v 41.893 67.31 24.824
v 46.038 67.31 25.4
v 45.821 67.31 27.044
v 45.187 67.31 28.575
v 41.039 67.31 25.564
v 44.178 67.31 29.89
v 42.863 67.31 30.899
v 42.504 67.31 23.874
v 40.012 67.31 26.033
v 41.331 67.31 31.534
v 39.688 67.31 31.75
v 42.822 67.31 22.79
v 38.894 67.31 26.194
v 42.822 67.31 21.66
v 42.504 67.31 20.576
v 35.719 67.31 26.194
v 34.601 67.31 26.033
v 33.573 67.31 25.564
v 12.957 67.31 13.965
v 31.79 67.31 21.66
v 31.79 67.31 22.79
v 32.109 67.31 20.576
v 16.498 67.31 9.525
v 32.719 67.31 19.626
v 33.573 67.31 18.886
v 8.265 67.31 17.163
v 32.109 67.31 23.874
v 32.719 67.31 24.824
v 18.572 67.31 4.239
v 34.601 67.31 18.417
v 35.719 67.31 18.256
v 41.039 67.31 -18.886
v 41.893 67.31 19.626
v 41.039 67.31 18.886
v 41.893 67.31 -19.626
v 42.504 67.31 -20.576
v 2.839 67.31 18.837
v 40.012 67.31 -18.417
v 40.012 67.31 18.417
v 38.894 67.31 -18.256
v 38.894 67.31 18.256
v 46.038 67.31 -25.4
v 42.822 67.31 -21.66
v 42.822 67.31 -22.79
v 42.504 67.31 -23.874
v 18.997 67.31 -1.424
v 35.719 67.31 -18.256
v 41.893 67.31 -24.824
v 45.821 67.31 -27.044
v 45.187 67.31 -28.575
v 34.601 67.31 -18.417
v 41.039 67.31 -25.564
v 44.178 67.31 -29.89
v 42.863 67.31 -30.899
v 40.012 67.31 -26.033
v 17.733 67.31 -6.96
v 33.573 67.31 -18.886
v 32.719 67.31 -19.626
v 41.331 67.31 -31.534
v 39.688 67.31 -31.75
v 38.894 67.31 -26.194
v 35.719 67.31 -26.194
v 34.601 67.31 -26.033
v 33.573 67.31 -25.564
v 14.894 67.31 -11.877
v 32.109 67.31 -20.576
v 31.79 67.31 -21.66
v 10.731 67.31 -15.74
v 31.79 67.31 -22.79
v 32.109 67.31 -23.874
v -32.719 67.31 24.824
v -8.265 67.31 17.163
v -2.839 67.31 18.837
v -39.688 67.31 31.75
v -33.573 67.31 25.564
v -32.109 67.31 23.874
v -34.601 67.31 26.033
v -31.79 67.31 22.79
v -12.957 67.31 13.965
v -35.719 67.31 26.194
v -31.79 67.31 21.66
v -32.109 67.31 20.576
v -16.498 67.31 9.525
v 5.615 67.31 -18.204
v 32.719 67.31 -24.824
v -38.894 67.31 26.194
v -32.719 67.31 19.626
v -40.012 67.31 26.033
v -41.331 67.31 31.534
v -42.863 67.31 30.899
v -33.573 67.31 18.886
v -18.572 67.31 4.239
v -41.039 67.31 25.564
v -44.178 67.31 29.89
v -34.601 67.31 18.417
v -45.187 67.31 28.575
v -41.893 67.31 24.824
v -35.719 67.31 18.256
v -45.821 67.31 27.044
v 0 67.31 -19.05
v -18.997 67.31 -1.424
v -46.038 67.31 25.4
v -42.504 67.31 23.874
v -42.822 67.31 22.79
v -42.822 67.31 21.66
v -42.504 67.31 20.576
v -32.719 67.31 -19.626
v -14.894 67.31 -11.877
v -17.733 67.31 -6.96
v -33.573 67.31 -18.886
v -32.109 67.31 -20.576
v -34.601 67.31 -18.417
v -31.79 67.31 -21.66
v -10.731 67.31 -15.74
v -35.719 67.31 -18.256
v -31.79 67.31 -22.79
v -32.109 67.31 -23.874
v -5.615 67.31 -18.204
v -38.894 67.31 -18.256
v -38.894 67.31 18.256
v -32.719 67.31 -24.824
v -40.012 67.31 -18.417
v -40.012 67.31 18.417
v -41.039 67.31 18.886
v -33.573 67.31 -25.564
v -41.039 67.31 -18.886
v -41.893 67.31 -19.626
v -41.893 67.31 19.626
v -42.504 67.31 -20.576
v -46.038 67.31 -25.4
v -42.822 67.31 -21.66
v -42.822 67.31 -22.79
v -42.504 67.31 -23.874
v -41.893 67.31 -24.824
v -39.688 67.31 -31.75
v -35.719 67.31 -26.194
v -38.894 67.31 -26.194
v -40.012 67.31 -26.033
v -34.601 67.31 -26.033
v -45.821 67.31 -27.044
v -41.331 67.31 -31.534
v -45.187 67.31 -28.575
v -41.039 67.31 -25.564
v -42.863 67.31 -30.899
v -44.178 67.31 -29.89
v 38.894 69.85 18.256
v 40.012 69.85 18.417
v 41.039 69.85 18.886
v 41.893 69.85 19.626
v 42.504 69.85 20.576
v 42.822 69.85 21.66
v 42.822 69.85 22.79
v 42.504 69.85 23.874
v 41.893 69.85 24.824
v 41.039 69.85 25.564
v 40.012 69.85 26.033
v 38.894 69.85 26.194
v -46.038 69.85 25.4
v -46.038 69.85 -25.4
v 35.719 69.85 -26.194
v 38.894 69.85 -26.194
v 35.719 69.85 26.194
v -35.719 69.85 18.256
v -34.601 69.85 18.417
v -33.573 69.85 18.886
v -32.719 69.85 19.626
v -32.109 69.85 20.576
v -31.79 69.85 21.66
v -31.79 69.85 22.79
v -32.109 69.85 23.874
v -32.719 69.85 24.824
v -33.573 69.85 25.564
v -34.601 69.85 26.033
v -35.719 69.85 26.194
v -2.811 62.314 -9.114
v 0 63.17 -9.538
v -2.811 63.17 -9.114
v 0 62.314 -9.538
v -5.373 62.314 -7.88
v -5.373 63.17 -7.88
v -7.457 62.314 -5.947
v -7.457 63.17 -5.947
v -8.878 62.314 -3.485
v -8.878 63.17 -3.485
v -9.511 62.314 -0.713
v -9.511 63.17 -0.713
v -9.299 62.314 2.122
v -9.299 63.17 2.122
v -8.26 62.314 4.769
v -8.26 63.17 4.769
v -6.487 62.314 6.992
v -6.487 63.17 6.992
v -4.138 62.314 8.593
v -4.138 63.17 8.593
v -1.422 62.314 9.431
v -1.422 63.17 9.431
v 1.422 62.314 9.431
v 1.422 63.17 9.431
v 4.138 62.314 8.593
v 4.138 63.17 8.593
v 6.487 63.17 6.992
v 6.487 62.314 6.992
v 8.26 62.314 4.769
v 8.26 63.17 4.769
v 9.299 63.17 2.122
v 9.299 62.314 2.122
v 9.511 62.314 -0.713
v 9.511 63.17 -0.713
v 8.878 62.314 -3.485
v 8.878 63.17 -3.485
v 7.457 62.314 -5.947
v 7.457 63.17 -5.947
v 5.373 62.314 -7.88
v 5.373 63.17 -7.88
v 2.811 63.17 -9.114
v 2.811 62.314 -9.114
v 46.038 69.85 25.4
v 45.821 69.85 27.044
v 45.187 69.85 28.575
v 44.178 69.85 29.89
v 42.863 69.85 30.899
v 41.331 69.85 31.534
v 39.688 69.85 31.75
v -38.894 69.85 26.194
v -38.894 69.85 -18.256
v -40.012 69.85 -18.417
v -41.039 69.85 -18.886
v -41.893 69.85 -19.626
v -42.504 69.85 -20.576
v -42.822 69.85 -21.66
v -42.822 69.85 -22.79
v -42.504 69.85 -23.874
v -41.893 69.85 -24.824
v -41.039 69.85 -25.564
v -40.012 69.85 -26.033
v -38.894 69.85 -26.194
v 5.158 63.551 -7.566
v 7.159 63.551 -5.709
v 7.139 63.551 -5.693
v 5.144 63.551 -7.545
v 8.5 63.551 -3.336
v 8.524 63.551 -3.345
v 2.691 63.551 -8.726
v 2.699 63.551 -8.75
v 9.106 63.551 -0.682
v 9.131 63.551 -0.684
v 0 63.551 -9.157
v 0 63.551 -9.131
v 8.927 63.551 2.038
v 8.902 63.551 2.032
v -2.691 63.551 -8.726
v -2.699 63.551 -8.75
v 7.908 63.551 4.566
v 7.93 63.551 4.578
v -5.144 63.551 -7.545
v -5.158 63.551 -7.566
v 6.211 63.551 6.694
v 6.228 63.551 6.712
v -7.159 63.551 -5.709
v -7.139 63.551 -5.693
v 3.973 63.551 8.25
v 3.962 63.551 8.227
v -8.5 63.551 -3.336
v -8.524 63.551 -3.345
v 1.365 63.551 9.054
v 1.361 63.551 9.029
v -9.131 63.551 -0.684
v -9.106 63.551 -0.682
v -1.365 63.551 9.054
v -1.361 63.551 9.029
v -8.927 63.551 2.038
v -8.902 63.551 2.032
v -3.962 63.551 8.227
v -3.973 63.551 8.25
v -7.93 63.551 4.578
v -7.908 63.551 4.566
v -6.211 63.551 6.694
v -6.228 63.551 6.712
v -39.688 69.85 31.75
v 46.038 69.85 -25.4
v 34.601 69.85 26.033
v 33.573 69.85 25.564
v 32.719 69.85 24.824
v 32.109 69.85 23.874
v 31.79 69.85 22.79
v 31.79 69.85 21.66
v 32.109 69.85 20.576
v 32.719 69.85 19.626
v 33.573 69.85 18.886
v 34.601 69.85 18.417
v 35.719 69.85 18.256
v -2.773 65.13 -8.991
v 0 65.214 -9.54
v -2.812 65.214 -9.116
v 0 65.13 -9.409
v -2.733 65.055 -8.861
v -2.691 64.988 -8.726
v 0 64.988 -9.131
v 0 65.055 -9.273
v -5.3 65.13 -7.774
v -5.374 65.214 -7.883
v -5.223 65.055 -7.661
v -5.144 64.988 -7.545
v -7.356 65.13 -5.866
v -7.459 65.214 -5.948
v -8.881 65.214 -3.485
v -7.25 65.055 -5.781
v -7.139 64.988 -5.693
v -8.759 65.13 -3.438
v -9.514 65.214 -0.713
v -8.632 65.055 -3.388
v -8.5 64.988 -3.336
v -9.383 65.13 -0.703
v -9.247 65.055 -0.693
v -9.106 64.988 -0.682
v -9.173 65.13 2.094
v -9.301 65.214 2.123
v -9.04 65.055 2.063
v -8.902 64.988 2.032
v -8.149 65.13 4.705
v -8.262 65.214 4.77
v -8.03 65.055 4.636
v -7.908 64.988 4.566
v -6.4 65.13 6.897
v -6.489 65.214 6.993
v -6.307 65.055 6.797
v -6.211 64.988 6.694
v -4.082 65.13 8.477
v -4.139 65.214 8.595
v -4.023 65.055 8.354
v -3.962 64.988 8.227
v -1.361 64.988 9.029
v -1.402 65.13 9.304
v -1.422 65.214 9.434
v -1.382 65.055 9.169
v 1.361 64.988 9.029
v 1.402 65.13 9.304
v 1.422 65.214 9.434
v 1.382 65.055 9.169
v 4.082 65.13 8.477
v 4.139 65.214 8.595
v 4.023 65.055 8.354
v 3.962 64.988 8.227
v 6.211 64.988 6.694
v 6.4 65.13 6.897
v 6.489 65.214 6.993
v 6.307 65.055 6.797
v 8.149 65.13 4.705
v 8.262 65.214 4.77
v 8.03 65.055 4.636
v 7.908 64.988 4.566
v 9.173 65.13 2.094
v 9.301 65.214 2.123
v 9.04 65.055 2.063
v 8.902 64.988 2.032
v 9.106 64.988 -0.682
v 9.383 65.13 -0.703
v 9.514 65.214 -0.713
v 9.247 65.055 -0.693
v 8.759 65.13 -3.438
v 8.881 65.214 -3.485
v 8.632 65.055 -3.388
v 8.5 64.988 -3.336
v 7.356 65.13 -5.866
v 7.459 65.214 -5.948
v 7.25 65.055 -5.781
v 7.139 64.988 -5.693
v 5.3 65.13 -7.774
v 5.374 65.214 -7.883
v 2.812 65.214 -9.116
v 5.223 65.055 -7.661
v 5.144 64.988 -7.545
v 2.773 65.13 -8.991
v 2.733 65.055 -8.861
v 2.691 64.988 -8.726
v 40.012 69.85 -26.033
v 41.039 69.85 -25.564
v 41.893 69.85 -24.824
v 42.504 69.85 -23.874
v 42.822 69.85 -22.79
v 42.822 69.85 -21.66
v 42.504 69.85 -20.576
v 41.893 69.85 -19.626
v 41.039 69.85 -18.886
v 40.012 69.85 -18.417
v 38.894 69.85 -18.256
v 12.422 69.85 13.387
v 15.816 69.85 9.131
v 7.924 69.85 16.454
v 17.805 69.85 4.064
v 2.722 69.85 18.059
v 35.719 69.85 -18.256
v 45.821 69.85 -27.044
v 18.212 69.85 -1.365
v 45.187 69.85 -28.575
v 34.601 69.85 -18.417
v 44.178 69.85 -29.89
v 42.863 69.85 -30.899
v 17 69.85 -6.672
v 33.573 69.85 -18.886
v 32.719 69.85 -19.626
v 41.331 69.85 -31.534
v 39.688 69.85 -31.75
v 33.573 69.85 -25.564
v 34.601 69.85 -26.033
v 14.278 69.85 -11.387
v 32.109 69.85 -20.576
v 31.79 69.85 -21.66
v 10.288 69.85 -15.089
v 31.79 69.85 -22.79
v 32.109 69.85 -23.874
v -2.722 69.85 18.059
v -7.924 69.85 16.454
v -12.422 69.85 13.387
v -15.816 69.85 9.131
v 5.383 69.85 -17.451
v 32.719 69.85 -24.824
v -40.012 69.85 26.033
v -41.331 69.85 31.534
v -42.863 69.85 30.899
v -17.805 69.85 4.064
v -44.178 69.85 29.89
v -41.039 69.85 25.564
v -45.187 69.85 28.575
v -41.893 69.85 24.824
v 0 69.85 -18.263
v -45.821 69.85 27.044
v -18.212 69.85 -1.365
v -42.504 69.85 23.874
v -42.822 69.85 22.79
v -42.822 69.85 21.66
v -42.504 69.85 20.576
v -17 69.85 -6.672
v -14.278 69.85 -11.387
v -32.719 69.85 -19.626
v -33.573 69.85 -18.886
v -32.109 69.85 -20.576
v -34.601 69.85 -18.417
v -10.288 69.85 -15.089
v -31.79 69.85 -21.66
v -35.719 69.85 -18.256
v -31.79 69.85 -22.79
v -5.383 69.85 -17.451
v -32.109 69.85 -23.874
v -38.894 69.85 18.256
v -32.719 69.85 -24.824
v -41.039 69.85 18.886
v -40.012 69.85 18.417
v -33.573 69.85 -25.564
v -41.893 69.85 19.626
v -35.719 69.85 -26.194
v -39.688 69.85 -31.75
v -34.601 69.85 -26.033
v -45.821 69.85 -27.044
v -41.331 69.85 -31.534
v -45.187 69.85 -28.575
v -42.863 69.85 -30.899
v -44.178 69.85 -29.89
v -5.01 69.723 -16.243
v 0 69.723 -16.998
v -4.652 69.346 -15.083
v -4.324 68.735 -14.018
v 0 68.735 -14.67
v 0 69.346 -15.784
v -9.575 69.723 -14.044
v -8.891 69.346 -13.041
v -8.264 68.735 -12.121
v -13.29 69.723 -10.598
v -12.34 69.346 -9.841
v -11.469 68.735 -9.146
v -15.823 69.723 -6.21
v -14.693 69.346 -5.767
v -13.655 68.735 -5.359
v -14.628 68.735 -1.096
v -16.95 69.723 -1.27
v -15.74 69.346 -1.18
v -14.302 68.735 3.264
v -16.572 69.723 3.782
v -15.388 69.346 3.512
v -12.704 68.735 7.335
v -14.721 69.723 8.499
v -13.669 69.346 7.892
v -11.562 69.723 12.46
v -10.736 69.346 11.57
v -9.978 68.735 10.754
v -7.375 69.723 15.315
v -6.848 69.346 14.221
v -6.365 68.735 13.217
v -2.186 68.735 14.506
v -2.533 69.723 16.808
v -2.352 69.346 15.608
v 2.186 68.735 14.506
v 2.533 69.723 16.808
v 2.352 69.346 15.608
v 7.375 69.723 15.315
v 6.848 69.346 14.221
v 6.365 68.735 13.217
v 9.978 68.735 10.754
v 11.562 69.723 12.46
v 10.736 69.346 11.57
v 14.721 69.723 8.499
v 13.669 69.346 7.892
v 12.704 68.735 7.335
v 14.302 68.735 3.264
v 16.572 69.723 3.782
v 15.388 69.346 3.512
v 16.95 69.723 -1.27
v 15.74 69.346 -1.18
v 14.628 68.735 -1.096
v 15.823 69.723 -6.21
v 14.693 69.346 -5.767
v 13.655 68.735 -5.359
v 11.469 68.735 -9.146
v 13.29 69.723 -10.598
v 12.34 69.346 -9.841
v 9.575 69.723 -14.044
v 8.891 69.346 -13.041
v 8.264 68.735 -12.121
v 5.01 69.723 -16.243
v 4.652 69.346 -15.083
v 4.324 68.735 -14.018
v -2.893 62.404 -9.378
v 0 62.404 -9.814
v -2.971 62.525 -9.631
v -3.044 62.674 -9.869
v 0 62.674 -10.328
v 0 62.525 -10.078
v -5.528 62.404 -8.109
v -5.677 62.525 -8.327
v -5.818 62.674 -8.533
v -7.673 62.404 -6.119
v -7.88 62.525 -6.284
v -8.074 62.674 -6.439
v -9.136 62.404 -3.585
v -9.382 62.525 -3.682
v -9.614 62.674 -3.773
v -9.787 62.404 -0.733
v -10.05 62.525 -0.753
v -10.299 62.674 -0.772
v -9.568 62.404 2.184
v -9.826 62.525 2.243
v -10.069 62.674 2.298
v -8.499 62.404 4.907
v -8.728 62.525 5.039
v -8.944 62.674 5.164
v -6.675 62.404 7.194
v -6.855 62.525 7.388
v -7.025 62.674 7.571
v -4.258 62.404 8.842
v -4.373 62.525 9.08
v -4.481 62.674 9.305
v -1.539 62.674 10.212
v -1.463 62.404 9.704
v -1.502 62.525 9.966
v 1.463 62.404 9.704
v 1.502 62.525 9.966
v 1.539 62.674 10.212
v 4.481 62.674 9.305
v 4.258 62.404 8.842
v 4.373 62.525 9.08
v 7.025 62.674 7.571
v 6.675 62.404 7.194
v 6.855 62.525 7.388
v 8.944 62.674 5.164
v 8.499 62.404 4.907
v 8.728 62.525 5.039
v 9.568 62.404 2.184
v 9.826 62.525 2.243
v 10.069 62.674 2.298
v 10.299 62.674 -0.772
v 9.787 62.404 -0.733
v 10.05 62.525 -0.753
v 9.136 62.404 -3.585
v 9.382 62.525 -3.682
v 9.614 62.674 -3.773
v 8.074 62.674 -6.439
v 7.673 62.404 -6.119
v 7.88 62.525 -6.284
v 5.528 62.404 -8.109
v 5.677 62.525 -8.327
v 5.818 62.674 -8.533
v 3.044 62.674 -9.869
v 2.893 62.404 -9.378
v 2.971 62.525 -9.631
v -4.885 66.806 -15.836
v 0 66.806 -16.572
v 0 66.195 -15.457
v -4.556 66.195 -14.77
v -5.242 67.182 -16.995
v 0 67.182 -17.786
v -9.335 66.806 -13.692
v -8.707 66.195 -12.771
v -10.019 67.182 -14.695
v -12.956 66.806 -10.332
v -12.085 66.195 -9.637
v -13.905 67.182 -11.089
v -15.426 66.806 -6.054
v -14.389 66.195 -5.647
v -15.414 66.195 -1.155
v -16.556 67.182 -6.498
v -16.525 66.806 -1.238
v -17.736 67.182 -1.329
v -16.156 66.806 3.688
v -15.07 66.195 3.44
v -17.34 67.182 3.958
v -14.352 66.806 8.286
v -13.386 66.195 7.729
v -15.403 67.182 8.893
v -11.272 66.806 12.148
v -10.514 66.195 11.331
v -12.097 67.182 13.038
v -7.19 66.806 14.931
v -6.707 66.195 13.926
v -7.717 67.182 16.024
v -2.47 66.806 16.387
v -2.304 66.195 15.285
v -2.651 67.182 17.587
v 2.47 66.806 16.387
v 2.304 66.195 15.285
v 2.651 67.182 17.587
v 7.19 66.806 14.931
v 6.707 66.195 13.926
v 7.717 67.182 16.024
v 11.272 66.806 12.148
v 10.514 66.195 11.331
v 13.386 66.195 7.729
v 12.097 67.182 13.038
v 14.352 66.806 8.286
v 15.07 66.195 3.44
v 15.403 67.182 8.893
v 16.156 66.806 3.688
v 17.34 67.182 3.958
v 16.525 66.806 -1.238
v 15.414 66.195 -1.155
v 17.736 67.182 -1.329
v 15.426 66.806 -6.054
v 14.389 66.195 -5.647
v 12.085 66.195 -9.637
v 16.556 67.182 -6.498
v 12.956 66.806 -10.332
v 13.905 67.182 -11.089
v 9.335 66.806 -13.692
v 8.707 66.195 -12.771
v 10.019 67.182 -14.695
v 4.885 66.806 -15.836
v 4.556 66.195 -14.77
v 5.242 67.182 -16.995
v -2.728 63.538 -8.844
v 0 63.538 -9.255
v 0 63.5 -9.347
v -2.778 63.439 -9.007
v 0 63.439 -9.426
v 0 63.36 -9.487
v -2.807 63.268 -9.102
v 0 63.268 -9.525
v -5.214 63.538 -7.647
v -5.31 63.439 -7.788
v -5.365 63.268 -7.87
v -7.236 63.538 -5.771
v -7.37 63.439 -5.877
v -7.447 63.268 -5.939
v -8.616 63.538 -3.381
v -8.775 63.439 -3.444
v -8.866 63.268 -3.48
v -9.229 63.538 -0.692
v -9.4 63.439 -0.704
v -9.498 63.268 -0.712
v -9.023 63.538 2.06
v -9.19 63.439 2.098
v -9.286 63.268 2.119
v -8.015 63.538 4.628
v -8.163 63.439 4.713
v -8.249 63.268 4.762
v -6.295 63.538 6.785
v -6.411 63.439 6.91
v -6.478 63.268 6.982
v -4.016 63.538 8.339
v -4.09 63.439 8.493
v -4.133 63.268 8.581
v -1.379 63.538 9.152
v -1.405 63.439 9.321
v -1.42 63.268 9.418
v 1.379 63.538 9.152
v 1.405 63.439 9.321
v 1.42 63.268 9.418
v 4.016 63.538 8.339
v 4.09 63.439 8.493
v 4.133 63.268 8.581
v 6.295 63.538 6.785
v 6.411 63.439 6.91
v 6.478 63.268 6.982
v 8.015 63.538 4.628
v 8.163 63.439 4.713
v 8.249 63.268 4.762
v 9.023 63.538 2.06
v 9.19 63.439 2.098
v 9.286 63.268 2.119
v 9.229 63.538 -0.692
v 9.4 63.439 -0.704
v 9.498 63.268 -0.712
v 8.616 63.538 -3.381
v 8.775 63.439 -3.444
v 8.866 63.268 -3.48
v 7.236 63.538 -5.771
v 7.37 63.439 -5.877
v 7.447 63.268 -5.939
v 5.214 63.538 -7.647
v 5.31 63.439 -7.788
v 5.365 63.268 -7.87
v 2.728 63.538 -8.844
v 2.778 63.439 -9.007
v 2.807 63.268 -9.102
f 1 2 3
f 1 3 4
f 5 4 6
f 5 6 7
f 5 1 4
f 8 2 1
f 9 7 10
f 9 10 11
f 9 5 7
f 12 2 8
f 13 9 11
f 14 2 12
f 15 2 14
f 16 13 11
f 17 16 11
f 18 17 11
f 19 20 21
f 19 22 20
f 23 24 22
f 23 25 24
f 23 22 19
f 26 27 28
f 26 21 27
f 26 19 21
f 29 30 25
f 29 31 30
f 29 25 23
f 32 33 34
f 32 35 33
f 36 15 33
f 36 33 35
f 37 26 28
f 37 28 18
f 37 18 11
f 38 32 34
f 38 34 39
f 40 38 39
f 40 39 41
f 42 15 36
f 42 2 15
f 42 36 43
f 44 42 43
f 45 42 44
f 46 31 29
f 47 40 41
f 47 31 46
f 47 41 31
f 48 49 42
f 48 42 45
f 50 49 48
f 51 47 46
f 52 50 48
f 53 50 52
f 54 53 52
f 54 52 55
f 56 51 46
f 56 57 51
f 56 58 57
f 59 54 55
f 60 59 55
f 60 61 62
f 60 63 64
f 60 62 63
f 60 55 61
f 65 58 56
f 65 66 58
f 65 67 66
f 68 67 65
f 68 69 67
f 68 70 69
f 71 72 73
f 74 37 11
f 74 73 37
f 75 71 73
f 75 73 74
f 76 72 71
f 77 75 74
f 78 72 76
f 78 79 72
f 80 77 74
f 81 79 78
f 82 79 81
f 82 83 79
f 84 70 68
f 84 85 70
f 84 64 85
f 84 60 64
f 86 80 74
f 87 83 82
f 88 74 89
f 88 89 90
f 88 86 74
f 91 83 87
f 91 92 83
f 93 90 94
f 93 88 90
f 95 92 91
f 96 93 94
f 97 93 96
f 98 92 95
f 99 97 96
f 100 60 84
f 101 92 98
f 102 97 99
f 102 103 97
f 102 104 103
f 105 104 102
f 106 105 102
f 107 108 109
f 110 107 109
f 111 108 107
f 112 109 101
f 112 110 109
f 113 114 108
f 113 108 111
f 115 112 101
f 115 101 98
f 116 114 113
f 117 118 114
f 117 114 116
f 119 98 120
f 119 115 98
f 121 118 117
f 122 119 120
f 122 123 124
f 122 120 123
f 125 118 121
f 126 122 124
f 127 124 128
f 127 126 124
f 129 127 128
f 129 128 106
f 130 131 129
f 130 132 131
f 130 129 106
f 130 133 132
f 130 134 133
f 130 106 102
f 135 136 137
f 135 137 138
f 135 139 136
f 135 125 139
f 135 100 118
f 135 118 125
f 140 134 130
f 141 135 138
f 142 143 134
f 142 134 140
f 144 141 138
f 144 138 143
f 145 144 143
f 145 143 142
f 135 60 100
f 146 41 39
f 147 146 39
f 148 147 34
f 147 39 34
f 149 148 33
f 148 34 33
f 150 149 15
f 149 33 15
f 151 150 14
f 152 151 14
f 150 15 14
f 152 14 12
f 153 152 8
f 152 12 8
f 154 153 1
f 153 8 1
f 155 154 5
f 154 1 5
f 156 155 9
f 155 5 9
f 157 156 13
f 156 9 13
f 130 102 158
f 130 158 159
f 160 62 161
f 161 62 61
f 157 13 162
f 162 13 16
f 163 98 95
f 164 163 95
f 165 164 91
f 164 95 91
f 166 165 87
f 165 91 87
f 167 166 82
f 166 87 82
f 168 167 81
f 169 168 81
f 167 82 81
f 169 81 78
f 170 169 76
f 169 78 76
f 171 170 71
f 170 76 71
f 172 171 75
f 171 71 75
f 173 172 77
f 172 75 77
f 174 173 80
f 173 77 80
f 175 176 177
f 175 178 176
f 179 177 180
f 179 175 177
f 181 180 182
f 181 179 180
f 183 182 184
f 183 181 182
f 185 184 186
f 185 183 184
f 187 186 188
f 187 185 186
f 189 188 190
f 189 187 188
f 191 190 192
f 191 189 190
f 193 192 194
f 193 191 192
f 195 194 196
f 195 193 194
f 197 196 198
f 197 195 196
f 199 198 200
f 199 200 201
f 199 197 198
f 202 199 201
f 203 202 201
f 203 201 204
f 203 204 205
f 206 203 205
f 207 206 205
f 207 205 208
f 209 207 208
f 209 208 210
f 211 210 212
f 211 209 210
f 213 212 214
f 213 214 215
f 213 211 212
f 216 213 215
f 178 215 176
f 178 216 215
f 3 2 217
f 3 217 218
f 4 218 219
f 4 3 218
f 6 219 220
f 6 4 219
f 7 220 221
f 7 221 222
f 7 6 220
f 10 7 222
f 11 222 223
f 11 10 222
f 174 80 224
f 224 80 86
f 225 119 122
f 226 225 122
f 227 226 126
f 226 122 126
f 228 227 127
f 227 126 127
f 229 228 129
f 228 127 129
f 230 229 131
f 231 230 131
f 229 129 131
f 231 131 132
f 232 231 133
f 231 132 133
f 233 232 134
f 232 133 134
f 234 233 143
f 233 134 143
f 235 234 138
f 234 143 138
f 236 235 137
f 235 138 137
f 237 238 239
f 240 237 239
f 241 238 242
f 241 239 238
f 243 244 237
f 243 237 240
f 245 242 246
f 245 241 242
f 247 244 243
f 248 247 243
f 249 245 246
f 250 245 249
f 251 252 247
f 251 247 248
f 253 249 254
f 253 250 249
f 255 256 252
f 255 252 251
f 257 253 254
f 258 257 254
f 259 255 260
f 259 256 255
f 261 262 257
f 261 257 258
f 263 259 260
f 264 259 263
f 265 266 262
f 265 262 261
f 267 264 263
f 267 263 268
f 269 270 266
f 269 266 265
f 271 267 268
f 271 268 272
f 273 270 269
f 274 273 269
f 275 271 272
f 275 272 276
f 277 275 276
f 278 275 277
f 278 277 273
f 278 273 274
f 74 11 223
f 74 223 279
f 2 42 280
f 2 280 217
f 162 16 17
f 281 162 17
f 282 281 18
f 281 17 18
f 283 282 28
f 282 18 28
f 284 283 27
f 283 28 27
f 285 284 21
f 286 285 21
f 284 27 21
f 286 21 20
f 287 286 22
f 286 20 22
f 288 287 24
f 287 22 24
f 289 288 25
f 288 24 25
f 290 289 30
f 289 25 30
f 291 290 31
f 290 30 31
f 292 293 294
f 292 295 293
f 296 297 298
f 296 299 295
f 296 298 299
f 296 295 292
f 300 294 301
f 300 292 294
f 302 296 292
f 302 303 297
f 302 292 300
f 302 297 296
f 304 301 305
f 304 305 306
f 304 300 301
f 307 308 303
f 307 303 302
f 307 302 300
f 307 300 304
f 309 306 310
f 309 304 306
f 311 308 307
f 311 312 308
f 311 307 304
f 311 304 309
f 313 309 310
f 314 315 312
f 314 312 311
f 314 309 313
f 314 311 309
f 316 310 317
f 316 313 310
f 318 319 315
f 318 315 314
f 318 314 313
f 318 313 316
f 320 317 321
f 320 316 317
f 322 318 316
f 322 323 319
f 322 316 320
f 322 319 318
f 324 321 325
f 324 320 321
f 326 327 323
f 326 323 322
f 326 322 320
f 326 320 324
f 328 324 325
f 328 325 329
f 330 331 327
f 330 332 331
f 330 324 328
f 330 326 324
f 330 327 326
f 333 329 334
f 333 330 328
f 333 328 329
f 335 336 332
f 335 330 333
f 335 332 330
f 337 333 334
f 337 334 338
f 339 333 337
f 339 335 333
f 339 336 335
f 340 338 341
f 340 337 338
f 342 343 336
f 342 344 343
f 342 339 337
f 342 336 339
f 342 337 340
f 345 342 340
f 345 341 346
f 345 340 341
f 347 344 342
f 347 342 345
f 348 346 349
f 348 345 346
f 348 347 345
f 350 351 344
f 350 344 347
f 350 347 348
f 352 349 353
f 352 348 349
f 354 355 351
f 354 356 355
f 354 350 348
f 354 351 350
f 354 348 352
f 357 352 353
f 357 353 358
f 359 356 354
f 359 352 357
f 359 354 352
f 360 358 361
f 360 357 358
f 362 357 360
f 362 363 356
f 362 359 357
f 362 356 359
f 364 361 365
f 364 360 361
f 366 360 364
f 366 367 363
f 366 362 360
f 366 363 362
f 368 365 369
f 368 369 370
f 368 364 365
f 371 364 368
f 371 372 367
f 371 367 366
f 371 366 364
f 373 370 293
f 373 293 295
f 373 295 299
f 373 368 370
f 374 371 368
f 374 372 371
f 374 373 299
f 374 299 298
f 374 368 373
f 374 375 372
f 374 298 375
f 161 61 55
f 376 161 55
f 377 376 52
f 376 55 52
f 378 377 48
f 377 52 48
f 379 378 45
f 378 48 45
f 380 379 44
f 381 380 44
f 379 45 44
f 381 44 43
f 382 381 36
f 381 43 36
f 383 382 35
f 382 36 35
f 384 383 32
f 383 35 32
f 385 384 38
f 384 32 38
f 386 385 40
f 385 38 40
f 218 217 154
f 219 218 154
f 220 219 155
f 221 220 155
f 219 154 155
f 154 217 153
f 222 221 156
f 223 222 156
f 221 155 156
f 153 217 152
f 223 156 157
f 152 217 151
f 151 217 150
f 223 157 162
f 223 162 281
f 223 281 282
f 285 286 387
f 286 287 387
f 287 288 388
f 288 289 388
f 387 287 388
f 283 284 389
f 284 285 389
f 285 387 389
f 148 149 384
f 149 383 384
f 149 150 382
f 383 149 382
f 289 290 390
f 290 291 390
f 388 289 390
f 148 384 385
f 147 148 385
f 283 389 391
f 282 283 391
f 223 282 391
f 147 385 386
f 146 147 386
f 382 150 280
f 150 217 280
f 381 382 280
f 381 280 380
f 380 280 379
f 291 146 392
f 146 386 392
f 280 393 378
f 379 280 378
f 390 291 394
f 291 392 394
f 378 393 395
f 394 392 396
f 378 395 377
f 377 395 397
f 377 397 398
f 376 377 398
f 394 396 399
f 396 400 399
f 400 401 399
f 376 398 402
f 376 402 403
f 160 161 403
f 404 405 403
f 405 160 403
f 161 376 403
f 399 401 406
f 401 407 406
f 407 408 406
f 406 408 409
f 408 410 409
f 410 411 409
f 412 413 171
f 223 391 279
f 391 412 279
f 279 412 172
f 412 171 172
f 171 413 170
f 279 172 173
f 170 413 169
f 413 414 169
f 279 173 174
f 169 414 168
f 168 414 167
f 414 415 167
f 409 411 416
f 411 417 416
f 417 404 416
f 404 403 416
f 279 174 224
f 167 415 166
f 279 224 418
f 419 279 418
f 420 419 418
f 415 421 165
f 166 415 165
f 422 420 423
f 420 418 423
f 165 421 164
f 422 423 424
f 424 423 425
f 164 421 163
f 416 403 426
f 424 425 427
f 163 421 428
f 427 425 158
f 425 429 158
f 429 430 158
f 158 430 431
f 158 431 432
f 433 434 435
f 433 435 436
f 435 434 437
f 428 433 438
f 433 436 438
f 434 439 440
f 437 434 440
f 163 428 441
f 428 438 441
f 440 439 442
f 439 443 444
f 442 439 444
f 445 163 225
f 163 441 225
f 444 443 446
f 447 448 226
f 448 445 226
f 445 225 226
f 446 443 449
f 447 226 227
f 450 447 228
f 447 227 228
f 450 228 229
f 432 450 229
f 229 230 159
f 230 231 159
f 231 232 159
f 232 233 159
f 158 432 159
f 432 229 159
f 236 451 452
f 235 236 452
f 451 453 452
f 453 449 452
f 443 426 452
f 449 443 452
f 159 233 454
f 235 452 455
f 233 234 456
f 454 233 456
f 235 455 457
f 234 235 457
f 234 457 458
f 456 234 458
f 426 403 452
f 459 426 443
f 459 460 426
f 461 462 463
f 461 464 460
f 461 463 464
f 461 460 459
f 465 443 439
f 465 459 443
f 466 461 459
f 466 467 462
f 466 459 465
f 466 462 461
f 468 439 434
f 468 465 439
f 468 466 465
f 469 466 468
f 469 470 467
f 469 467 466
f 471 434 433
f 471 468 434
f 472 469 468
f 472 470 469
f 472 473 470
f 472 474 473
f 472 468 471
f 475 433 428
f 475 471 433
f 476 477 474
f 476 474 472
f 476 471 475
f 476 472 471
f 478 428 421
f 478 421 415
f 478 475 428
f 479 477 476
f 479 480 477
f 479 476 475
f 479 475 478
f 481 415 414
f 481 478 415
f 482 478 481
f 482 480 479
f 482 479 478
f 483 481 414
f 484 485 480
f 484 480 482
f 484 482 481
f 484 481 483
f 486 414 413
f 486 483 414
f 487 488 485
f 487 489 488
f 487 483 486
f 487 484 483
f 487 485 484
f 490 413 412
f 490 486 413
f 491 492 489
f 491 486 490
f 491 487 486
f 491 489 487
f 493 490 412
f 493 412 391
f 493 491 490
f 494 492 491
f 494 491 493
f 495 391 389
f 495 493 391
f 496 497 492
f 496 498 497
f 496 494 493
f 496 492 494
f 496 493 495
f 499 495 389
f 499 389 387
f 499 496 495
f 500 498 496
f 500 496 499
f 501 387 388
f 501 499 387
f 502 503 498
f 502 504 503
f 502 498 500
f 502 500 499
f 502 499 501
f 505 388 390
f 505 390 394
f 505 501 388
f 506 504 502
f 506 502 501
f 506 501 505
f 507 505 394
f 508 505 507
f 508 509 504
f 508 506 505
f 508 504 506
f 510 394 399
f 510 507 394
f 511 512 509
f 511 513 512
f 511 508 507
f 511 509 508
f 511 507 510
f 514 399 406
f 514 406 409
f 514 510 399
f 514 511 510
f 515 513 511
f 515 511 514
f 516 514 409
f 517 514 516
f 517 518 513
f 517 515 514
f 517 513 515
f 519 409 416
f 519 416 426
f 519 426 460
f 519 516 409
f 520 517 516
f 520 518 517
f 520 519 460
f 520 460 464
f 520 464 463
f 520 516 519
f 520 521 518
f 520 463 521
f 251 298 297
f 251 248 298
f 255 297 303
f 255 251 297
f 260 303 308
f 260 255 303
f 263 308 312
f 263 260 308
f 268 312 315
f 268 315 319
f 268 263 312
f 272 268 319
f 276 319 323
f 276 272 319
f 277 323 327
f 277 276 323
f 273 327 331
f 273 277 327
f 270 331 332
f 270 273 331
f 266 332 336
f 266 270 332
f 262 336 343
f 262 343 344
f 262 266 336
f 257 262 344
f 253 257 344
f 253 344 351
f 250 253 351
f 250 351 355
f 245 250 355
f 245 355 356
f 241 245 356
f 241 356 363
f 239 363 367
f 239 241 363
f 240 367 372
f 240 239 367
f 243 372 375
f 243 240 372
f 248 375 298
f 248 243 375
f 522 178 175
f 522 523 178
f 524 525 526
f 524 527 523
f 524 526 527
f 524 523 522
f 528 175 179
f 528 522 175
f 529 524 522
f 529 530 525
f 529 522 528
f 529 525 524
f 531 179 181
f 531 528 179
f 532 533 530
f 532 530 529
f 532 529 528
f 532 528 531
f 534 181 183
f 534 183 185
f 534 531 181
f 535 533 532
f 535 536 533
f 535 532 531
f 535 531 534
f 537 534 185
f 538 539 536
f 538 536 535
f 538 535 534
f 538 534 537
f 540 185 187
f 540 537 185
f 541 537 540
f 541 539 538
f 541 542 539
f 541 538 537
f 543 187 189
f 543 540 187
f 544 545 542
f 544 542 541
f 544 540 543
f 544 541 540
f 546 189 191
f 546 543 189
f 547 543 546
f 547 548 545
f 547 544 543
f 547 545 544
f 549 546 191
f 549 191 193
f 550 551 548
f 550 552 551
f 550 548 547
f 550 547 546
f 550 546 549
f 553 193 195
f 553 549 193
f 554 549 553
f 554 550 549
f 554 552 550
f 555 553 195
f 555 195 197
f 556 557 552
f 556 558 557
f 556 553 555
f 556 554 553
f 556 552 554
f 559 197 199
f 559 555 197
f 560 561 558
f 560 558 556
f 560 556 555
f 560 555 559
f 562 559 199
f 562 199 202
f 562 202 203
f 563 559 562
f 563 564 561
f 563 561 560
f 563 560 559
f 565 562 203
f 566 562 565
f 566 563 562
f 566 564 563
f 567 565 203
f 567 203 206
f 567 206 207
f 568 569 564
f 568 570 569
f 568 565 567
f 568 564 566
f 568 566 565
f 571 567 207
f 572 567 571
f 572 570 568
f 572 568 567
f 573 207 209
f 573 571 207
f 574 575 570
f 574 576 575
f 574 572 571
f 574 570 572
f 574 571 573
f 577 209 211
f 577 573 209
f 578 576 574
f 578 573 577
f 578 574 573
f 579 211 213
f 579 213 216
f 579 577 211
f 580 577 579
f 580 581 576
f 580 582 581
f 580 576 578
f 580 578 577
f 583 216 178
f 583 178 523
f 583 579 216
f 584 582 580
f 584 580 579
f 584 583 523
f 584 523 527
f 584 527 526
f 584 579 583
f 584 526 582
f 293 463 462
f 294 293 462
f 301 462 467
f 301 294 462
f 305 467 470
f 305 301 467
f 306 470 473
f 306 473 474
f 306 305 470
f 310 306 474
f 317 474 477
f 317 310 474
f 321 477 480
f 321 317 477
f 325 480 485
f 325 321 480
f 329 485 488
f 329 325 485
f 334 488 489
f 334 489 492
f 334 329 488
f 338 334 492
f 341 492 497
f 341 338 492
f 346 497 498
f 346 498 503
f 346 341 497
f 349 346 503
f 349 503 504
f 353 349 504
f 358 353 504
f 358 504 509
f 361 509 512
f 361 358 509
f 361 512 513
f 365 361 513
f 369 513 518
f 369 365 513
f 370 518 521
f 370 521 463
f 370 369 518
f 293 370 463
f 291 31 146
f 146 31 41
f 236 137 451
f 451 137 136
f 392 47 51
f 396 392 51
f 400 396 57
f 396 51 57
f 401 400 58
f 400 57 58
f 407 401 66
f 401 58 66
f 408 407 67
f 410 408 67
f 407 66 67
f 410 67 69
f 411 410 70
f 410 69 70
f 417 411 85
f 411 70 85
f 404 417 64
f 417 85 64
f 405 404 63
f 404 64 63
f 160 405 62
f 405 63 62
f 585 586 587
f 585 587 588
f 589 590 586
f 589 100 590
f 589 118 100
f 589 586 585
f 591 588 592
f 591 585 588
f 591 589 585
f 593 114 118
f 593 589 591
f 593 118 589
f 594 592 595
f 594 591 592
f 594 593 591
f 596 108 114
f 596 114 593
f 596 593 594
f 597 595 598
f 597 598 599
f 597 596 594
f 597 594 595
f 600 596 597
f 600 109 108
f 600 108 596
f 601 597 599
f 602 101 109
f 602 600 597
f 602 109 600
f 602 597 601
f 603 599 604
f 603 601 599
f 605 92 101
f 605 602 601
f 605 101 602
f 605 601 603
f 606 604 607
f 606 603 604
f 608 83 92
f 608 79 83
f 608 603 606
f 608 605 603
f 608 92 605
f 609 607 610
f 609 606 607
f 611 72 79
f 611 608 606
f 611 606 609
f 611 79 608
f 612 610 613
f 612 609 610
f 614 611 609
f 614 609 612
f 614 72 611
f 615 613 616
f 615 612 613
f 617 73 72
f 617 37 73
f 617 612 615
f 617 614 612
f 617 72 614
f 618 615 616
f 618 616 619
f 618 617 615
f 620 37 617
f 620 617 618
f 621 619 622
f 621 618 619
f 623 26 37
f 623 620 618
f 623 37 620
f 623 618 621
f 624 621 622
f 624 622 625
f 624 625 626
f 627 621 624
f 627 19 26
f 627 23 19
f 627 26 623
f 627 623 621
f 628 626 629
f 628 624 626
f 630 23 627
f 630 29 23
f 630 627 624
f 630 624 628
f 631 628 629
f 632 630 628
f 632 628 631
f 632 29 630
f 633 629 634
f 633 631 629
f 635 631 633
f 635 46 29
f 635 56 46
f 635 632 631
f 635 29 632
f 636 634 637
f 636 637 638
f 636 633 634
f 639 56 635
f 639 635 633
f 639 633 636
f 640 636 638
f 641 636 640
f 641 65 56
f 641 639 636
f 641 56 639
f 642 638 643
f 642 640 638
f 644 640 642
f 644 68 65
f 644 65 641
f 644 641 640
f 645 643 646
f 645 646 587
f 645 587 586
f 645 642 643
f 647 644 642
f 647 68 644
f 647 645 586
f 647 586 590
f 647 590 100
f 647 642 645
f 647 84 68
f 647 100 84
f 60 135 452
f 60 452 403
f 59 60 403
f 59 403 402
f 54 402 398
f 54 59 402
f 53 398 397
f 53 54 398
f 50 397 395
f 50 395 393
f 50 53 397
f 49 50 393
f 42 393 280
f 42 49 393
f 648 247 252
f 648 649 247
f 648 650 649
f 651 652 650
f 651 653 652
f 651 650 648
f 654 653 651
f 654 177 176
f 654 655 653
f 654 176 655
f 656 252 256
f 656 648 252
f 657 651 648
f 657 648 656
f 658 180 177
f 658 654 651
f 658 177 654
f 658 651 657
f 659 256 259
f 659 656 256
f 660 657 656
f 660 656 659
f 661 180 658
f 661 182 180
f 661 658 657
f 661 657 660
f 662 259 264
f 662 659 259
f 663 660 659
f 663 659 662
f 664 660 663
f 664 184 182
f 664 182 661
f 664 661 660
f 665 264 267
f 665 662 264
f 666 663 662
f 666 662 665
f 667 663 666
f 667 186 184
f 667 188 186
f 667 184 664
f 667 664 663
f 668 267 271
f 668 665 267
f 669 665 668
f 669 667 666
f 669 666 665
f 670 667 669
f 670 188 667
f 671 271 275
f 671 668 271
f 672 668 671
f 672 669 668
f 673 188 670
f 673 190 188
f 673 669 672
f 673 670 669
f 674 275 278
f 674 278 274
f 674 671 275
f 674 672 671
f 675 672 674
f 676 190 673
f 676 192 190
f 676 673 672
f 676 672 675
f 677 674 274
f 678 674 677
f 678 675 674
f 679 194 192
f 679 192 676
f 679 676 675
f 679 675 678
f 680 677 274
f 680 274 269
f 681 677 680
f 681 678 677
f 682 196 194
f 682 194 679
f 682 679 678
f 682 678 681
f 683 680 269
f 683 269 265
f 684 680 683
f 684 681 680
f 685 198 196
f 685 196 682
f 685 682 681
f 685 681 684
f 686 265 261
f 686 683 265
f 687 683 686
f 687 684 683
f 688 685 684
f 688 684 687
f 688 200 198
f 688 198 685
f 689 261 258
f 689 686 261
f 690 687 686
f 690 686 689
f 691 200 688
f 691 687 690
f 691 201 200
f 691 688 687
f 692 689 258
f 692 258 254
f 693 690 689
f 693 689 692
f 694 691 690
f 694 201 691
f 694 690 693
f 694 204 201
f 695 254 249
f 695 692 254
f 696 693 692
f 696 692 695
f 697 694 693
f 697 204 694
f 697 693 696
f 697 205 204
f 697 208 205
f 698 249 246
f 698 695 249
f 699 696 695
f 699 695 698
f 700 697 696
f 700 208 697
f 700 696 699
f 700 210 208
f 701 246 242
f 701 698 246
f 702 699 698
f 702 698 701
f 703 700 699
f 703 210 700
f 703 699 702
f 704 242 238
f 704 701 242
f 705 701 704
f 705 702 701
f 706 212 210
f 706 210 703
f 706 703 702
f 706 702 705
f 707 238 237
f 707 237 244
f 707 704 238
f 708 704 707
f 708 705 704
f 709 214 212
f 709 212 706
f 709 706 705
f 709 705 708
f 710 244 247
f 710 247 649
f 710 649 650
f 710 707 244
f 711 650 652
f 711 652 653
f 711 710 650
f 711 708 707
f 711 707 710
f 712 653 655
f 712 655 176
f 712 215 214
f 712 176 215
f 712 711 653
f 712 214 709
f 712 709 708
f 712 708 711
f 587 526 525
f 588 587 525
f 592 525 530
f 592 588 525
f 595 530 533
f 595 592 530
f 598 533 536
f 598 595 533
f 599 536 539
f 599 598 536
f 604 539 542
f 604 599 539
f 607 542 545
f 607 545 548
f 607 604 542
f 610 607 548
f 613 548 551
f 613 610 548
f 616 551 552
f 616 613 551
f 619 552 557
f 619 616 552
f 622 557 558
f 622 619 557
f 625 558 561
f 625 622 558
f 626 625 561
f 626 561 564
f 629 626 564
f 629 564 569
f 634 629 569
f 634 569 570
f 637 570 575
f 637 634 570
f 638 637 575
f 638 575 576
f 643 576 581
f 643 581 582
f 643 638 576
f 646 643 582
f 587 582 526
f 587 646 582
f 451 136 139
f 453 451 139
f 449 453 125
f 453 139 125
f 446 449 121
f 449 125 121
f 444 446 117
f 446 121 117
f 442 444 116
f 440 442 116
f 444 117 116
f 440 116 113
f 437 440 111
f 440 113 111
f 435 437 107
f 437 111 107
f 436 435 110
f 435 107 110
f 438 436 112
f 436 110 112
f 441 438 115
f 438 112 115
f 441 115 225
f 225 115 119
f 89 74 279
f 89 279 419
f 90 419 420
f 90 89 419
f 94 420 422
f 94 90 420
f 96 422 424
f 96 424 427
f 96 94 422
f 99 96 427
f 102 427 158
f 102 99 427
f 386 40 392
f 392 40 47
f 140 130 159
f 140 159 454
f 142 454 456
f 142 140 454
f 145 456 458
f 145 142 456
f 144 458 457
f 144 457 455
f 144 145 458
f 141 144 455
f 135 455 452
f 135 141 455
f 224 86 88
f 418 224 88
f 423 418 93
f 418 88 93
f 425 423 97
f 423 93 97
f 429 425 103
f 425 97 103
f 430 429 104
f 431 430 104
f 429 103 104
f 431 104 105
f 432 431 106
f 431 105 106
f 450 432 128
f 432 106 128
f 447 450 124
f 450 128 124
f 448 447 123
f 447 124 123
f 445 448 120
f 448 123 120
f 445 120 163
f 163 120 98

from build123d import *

# Parameters (mm, degrees)
SK_PLATE_OUTLINE_SLOTS_R = 19.05
EXT_PLATE_DEPTH          = 2.54


with BuildPart() as part:
    # Sk_pressed_centre → Rev_pressed_centre (revolve)
    with BuildSketch(Plane.XY, mode=Mode.PRIVATE) as rev_pressed_centre_sk:
        with BuildLine():
            Line((19.304, 69.85), (18.2626, 69.85))
            ThreePointArc((18.2626, 69.85), (16.381490046, 69.564975304), (14.669516, 68.73494))
            Line((14.669516, 68.73494), (9.54024, 65.2145))
            ThreePointArc((9.54024, 65.2145), (9.341458064, 65.091180356), (9.1313, 64.98844))
            Line((9.1313, 64.98844), (9.1313, 63.5508))
            Line((9.1313, 63.5508), (9.1567, 63.5508))
            ThreePointArc((9.1567, 63.5508), (9.426107684, 63.439207684), (9.5377, 63.1698))
            Line((9.5377, 63.1698), (9.5377, 62.31382))
            ThreePointArc((9.5377, 62.31382), (9.947965238, 62.460661275), (10.32764, 62.6745))
            Line((10.32764, 62.6745), (15.45717, 66.19494))
            ThreePointArc((15.45717, 66.19494), (17.169221611, 67.02429691), (19.05, 67.31))
            Line((19.05, 67.31), (19.304, 67.31))
            Line((19.304, 67.31), (19.304, 69.85))
        make_face()
    revolve(rev_pressed_centre_sk.sketch.rotate(Axis((0, -25.4, 0), (0, 1, 0)), 90), axis=Axis((0, -25.4, 0), (0, 1, 0)))

    # Sk_plate_outline_slots → Ext_plate (add)
    with BuildSketch(Plane(origin=(0, 67.31, 0), x_dir=(1, 0, 0), z_dir=(0, 1, 0))):
        with BuildLine():
            Line((-39.6875, 31.75), (39.6875, 31.75))
            ThreePointArc((39.6875, 31.75), (44.177628061, 29.890128061), (46.0375, 25.4))
            Line((46.0375, 25.4), (46.0375, -25.4))
            ThreePointArc((46.0375, -25.4), (44.177628061, -29.890128061), (39.6875, -31.75))
            Line((39.6875, -31.75), (-39.6875, -31.75))
            ThreePointArc((-39.6875, -31.75), (-44.177628061, -29.890128061), (-46.0375, -25.4))
            Line((-46.0375, -25.4), (-46.0375, 25.4))
            ThreePointArc((-46.0375, 25.4), (-44.177628061, 29.890128061), (-39.6875, 31.75))
        make_face()
        Circle(SK_PLATE_OUTLINE_SLOTS_R, mode=Mode.SUBTRACT)
        with BuildLine():
            Line((-38.89375, 26.19375), (-35.71875, 26.19375))
            ThreePointArc((-35.71875, 26.19375), (-31.75, 22.225), (-35.71875, 18.25625))
            Line((-35.71875, 18.25625), (-38.89375, 18.25625))
            ThreePointArc((-38.89375, 18.25625), (-42.8625, 22.225), (-38.89375, 26.19375))
        make_face(mode=Mode.SUBTRACT)
        with BuildLine():
            Line((-38.89375, -18.25625), (-35.71875, -18.25625))
            ThreePointArc((-35.71875, -18.25625), (-31.75, -22.225), (-35.71875, -26.19375))
            Line((-35.71875, -26.19375), (-38.89375, -26.19375))
            ThreePointArc((-38.89375, -26.19375), (-42.8625, -22.225), (-38.89375, -18.25625))
        make_face(mode=Mode.SUBTRACT)
        with BuildLine():
            Line((35.71875, 26.19375), (38.89375, 26.19375))
            ThreePointArc((38.89375, 26.19375), (42.8625, 22.225), (38.89375, 18.25625))
            Line((38.89375, 18.25625), (35.71875, 18.25625))
            ThreePointArc((35.71875, 18.25625), (31.75, 22.225), (35.71875, 26.19375))
        make_face(mode=Mode.SUBTRACT)
        with BuildLine():
            Line((35.71875, -18.25625), (38.89375, -18.25625))
            ThreePointArc((38.89375, -18.25625), (42.8625, -22.225), (38.89375, -26.19375))
            Line((38.89375, -26.19375), (35.71875, -26.19375))
            ThreePointArc((35.71875, -26.19375), (31.75, -22.225), (35.71875, -18.25625))
        make_face(mode=Mode.SUBTRACT)
    extrude(amount=EXT_PLATE_DEPTH)


solid = part.part
